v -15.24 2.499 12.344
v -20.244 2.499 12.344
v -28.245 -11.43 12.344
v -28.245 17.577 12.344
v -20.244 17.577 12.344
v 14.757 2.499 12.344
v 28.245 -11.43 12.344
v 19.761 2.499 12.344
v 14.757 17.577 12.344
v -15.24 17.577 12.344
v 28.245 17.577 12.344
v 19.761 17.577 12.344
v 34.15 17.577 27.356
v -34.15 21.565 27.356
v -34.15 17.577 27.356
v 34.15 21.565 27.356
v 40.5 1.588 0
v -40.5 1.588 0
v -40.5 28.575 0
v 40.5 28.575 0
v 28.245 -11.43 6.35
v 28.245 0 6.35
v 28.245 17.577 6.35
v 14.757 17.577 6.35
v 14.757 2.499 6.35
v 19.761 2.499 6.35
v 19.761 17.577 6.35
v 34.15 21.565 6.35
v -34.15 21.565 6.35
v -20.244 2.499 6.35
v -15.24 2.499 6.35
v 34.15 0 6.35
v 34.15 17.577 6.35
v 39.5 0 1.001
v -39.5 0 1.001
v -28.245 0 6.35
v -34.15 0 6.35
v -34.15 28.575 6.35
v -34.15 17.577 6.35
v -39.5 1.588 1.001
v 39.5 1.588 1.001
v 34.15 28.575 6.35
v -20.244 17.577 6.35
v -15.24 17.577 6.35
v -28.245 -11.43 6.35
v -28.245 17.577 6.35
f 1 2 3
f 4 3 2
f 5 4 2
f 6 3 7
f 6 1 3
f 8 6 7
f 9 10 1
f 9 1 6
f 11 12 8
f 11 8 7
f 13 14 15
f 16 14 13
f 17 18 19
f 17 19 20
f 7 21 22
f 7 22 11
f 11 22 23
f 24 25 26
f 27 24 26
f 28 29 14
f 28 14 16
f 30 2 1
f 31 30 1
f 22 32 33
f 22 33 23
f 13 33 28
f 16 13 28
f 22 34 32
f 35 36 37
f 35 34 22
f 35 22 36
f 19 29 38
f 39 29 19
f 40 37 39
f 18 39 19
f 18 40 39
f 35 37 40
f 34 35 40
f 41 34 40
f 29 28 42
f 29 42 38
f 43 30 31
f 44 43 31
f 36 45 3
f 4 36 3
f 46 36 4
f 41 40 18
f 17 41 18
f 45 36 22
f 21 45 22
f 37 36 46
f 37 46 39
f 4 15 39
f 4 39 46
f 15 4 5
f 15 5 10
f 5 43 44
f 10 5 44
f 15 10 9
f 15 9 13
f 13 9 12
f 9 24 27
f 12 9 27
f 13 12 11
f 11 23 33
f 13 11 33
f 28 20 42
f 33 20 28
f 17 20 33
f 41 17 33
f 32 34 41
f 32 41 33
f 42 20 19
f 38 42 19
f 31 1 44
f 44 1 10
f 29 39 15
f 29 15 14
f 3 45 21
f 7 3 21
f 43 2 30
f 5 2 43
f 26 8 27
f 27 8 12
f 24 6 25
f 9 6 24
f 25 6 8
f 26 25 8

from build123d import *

# Parameters (mm, degrees)
BOSS_EXTRUDE1_DEPTH     = 28.575
SKETCH2_W               = 1.00076
SKETCH2_H               = 1.5875
CUT_EXTRUDE2_DEPTH      = 41.5003
CUT_EXTRUDE2_DEPTH_BACK = 41.5003
SKETCH3_W               = 68.3006
SKETCH3_H               = 3.9878
BOSS_EXTRUDE2_DEPTH     = 21.0058
SKETCH4_W               = 56.4896
SKETCH4_H               = 29.0068
BOSS_EXTRUDE3_DEPTH     = 5.9944
SKETCH5_W               = 5.0038
SKETCH5_H               = 15.07744
CUT_EXTRUDE3_DEPTH      = 5.9944


with BuildPart() as part:
    # Sketch1 → Boss-Extrude1 (new body)
    with BuildSketch(Plane(origin=(0, 0, 0), x_dir=(1, 0, 0), z_dir=(0, 1, 0))):
        Polygon((-40.5003, 0), (40.5003, 0), (34.1503, -6.35), (-34.1503, -6.35), align=None)
    extrude(amount=BOSS_EXTRUDE1_DEPTH)

    # Sketch2 → Cut-Extrude2 (cut, two sides)
    with BuildSketch(Plane(origin=(0, 0, 0), x_dir=(0, 0, -1), z_dir=(1, 0, 0))) as cut_extrude2_sk:
        with Locations((-0.50038, 0.79375)):
            Rectangle(SKETCH2_W, SKETCH2_H)
    extrude(amount=CUT_EXTRUDE2_DEPTH, mode=Mode.SUBTRACT)
    extrude(cut_extrude2_sk.sketch, amount=-CUT_EXTRUDE2_DEPTH_BACK, mode=Mode.SUBTRACT)

    # Sketch3 → Boss-Extrude2 (add)
    with BuildSketch(Plane.XY.offset(6.35)):
        with Locations((0, 19.5707)):
            Rectangle(SKETCH3_W, SKETCH3_H)
    extrude(amount=BOSS_EXTRUDE2_DEPTH)

    # Sketch4 → Boss-Extrude3 (add)
    with BuildSketch(Plane.XY.offset(6.35)):
        with Locations((0, 3.0734)):
            Rectangle(SKETCH4_W, SKETCH4_H)
    extrude(amount=BOSS_EXTRUDE3_DEPTH)

    # Sketch5 → Cut-Extrude3 (cut)
    with BuildSketch(Plane.XY.offset(12.3444)):
        with Locations((-17.7419, 10.03808)):
            Rectangle(SKETCH5_W, SKETCH5_H)
        with Locations((17.2593, 10.03808)):
            Rectangle(SKETCH5_W, SKETCH5_H)
    extrude(amount=-CUT_EXTRUDE3_DEPTH, mode=Mode.SUBTRACT)


solid = part.part
